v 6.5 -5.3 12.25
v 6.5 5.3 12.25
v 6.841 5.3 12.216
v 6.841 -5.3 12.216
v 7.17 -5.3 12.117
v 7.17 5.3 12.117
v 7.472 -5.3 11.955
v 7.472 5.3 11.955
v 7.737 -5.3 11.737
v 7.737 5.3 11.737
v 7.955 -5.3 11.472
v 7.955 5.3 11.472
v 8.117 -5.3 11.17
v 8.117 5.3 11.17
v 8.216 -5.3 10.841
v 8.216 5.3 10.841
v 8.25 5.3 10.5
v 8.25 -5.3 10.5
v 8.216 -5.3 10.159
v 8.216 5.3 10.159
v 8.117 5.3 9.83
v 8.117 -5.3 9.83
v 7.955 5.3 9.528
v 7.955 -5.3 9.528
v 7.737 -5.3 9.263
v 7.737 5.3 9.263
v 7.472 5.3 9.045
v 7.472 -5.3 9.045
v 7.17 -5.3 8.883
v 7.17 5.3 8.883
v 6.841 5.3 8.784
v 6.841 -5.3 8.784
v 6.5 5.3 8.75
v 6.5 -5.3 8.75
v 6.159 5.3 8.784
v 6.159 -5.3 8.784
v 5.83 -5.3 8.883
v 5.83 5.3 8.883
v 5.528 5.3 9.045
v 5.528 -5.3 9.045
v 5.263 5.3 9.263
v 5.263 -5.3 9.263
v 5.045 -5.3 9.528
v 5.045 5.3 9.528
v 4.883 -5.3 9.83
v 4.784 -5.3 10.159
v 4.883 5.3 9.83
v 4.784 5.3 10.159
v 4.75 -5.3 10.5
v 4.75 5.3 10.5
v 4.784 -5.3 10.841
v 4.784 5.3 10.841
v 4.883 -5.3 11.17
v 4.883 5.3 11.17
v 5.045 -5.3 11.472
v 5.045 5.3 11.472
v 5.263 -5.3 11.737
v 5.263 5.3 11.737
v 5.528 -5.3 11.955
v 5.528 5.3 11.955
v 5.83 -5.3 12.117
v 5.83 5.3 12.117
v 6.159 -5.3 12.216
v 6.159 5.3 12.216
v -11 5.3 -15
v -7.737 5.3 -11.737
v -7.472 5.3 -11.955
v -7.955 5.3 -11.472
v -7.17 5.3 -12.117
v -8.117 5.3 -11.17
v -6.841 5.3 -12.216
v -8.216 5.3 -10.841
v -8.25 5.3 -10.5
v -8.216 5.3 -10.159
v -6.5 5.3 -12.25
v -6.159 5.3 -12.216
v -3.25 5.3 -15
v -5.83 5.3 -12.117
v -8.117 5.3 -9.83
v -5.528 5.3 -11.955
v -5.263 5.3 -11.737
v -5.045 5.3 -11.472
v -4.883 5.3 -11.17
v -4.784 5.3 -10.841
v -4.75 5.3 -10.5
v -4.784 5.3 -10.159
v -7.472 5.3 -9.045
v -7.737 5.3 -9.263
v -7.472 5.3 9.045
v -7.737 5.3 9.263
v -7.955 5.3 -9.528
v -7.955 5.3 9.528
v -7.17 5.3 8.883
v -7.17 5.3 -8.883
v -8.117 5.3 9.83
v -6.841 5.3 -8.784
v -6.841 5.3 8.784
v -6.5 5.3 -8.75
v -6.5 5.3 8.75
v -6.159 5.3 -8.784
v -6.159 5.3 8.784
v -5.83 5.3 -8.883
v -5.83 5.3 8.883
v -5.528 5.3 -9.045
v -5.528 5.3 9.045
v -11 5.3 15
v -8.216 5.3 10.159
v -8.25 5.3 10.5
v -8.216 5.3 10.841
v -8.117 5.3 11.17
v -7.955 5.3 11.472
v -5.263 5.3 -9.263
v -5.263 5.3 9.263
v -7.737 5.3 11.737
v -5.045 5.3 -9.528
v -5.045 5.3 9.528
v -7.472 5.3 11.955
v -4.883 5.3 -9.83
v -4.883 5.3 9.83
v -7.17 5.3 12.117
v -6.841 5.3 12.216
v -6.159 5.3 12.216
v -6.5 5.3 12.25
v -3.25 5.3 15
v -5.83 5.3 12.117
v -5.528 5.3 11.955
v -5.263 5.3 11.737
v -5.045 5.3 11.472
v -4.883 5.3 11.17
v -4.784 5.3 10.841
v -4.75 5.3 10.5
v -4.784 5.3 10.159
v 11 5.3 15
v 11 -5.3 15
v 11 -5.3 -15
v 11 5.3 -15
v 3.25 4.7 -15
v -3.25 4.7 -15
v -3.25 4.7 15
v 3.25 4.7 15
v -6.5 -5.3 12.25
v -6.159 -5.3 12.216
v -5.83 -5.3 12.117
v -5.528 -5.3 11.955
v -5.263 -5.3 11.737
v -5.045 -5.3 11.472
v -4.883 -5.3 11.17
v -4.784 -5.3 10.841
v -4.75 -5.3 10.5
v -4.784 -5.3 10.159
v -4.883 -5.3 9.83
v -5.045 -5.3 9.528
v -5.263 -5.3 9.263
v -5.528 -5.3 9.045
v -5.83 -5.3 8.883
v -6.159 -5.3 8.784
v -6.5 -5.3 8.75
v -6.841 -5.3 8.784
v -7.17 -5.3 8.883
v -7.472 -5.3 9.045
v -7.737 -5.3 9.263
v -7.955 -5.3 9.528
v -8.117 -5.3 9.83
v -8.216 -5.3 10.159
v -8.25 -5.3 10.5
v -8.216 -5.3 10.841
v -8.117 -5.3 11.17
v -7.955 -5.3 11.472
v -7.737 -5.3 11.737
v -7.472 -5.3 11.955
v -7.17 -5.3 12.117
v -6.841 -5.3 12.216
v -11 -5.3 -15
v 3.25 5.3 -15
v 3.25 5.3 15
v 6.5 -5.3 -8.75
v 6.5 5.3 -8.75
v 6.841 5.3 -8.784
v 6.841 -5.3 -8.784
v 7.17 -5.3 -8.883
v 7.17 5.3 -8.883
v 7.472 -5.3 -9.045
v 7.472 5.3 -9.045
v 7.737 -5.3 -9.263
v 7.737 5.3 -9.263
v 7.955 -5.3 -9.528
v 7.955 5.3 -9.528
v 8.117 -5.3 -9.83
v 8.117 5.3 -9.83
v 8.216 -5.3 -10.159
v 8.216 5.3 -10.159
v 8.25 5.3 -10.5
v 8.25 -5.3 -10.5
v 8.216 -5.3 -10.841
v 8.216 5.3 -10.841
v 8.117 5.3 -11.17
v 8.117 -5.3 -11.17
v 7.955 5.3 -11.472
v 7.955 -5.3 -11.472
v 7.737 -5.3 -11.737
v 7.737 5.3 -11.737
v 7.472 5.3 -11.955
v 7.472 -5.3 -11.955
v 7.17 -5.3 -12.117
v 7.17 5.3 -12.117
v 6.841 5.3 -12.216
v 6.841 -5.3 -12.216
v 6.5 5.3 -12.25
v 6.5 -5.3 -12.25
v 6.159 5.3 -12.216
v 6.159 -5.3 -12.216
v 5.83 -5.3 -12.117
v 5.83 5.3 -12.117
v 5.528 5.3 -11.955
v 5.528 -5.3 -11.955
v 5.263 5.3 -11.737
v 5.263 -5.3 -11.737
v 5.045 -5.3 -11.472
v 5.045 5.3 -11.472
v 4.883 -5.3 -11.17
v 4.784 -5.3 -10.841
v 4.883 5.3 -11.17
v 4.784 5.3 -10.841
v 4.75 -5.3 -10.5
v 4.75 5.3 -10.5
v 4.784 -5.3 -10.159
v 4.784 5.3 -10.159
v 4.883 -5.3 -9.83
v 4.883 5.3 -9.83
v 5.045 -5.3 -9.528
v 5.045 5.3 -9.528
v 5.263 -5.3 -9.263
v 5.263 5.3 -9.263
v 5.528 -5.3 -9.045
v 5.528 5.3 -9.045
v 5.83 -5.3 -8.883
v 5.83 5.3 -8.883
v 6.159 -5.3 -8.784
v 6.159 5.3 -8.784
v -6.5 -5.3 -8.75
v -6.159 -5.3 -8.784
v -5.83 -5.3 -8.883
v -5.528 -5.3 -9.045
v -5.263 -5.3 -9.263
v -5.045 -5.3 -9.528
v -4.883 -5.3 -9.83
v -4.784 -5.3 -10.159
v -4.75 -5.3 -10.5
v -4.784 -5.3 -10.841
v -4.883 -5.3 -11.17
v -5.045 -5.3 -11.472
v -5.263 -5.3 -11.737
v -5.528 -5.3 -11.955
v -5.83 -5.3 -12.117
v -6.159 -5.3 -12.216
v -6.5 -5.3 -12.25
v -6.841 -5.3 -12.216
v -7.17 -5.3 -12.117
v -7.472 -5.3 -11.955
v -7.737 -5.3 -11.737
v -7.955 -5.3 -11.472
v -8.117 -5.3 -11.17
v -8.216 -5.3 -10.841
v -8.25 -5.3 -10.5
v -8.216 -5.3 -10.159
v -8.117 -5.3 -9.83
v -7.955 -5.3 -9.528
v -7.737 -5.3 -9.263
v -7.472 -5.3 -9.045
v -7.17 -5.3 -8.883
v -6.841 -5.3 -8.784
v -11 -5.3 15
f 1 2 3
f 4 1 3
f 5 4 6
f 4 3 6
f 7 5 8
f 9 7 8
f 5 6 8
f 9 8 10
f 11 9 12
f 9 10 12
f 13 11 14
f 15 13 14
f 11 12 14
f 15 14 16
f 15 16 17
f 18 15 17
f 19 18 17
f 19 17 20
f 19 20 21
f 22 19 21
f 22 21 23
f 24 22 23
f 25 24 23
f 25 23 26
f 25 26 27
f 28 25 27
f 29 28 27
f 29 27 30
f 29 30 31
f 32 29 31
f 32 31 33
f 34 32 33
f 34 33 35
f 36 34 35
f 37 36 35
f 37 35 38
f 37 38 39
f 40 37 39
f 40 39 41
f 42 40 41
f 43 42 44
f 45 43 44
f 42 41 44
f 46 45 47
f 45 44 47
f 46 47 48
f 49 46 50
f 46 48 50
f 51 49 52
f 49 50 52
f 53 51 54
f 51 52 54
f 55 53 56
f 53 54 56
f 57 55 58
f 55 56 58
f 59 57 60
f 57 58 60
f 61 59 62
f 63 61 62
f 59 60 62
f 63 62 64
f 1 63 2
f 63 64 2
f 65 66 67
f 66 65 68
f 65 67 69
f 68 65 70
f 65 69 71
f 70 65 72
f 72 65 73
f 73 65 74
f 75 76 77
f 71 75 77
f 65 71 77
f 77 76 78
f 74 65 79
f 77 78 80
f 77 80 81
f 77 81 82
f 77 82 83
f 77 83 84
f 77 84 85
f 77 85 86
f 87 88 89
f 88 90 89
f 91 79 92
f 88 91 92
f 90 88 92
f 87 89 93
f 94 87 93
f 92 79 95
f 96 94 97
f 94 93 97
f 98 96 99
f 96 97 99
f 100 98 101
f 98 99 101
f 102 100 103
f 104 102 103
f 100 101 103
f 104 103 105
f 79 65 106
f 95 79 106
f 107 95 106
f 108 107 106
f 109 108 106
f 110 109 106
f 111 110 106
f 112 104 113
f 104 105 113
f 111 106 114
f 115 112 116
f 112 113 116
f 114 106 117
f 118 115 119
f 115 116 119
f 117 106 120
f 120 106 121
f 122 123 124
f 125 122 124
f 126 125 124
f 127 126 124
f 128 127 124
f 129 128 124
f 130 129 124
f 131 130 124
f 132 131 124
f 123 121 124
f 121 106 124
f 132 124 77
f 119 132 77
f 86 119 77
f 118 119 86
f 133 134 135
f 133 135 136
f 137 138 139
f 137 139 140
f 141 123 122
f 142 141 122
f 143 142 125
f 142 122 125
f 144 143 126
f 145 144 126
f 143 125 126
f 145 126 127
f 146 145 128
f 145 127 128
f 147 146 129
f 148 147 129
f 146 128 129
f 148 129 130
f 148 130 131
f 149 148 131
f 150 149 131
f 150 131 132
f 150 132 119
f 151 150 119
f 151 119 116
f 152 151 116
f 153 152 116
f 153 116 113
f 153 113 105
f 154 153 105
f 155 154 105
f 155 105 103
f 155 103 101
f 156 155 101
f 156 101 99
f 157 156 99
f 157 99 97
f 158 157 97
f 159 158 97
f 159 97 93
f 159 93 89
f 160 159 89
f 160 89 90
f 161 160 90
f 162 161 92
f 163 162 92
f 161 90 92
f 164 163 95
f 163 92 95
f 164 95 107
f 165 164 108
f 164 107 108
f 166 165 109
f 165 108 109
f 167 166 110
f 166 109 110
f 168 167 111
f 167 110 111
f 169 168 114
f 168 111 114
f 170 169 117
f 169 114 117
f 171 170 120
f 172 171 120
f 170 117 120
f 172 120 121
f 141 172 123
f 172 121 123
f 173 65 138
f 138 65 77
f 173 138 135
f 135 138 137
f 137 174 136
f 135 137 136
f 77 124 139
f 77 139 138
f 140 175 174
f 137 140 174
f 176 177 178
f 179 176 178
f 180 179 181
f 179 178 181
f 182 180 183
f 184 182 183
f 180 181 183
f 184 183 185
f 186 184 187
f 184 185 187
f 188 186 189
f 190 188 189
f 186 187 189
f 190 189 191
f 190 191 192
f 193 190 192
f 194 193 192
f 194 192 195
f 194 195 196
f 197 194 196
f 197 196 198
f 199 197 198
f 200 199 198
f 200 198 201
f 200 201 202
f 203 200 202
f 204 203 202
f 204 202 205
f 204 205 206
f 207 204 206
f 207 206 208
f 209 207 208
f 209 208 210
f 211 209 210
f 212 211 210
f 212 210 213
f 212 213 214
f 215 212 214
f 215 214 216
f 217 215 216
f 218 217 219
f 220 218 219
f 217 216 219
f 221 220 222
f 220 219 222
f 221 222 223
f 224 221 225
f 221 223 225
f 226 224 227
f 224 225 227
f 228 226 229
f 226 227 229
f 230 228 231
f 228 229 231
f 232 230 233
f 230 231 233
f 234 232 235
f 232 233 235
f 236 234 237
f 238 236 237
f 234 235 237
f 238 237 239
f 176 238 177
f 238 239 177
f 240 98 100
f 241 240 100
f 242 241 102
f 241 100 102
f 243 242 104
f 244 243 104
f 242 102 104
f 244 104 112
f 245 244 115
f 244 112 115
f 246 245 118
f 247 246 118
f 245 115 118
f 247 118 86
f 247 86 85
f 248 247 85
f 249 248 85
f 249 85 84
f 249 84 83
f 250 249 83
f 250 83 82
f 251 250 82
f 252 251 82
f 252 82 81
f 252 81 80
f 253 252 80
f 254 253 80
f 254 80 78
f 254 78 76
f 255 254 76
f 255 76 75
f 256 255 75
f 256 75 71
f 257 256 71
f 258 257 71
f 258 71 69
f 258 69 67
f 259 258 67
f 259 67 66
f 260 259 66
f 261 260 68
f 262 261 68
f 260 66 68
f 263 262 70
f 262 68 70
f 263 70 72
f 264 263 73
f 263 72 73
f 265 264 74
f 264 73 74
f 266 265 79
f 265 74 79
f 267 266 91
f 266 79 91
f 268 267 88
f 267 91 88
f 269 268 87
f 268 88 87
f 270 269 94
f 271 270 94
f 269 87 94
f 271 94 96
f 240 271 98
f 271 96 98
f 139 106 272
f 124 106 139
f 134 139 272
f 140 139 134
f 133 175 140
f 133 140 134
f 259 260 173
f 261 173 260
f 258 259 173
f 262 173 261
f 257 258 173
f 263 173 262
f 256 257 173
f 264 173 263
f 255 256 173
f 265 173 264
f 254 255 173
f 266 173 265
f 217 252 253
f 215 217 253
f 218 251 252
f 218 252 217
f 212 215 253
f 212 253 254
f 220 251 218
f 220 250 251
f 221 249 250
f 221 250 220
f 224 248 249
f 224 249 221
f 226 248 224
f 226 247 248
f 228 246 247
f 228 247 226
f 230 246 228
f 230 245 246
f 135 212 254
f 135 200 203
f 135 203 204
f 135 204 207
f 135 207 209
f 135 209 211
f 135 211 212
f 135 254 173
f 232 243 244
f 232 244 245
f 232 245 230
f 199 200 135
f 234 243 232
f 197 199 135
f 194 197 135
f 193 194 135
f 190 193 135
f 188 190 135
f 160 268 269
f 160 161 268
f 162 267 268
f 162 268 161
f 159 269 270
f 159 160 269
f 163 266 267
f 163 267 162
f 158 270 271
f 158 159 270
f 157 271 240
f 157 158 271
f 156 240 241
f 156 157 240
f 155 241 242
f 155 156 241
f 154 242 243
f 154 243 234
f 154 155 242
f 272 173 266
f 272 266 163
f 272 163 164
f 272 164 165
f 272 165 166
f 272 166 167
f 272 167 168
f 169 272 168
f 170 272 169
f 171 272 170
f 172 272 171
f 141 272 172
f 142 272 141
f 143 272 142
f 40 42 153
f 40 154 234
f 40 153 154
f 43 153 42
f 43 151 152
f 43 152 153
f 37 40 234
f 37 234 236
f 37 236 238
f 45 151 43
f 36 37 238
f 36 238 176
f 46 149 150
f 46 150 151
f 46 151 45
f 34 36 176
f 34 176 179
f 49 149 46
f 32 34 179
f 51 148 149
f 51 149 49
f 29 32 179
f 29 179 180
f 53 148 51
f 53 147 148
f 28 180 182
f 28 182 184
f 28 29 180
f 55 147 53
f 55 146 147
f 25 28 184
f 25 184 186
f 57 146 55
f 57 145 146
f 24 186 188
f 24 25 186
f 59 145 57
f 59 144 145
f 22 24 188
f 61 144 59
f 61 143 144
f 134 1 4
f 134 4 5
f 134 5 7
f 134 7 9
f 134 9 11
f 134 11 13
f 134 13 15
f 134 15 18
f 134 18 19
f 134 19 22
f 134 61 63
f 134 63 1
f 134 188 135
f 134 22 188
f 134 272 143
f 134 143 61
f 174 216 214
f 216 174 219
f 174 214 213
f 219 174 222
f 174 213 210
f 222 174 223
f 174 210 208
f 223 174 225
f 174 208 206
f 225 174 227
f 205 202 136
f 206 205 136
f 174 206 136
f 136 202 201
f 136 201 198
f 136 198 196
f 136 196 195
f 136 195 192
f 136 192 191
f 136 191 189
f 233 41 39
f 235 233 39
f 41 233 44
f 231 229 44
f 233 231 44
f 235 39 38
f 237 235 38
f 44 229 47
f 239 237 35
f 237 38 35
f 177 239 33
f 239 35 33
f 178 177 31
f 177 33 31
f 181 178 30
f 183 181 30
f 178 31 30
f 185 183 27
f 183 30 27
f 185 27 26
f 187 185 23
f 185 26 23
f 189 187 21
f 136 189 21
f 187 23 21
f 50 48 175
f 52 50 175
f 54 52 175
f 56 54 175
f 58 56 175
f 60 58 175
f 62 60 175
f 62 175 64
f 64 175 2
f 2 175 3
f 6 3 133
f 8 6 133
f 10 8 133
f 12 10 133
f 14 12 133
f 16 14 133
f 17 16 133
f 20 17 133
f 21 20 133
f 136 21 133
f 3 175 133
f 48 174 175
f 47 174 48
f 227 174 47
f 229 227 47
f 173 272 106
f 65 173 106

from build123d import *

# Parameters (mm, degrees)
SCHIZZO1_W                   = 22
SCHIZZO1_H                   = 10.6
ESTRUSIONE_ESTRUSIONE1_DEPTH = 15
TAGLIO_ESTRUSIONE3_REACH     = 23.409
SCHIZZO5_R                   = 1.75
SCHIZZO5_3_W                 = 6.5
SCHIZZO5_3_H                 = 30
TAGLIO_ESTRUSIONE4_DEPTH     = 0.6


with BuildPart() as part:
    # Schizzo1 → Estrusione-Estrusione1 (new, symmetric)
    with BuildSketch(Plane.XY):
        Rectangle(SCHIZZO1_W, SCHIZZO1_H)
    extrude(amount=ESTRUSIONE_ESTRUSIONE1_DEPTH, both=True)

    # Schizzo5 → Taglio-Estrusione3 (cut, up to next)
    with BuildSketch(Plane(origin=(0, 5.3, 0), x_dir=(1, 0, 0), z_dir=(0, 1, 0)), mode=Mode.PRIVATE) as taglio_estrusione3_sk1:
        with Locations((6.5, 10.5)):
            Circle(SCHIZZO5_R)
    taglio_estrusione3_tool1 = extrude(taglio_estrusione3_sk1.sketch, amount=-TAGLIO_ESTRUSIONE3_REACH, mode=Mode.PRIVATE) & part.part
    # Schizzo5 → Taglio-Estrusione3 (cut, up to next)
    with BuildSketch(Plane(origin=(0, 5.3, 0), x_dir=(1, 0, 0), z_dir=(0, 1, 0)), mode=Mode.PRIVATE) as taglio_estrusione3_sk2:
        with Locations((6.5, -10.5)):
            Circle(SCHIZZO5_R)
    taglio_estrusione3_tool2 = extrude(taglio_estrusione3_sk2.sketch, amount=-TAGLIO_ESTRUSIONE3_REACH, mode=Mode.PRIVATE) & part.part
    # Schizzo5 → Taglio-Estrusione3 (cut, up to next)
    with BuildSketch(Plane(origin=(0, 5.3, 0), x_dir=(1, 0, 0), z_dir=(0, 1, 0)), mode=Mode.PRIVATE) as taglio_estrusione3_sk3:
        with Locations((-6.5, -10.5)):
            Circle(SCHIZZO5_R)
    taglio_estrusione3_tool3 = extrude(taglio_estrusione3_sk3.sketch, amount=-TAGLIO_ESTRUSIONE3_REACH, mode=Mode.PRIVATE) & part.part
    # Schizzo5 → Taglio-Estrusione3 (cut, up to next)
    with BuildSketch(Plane(origin=(0, 5.3, 0), x_dir=(1, 0, 0), z_dir=(0, 1, 0)), mode=Mode.PRIVATE) as taglio_estrusione3_sk4:
        with Locations((-6.5, 10.5)):
            Circle(SCHIZZO5_R)
    taglio_estrusione3_tool4 = extrude(taglio_estrusione3_sk4.sketch, amount=-TAGLIO_ESTRUSIONE3_REACH, mode=Mode.PRIVATE) & part.part
    add(taglio_estrusione3_tool1.solids().sort_by_distance((6.5, 5.3, -10.5))[0], mode=Mode.SUBTRACT)
    add(taglio_estrusione3_tool2.solids().sort_by_distance((6.5, 5.3, 10.5))[0], mode=Mode.SUBTRACT)
    add(taglio_estrusione3_tool3.solids().sort_by_distance((-6.5, 5.3, 10.5))[0], mode=Mode.SUBTRACT)
    add(taglio_estrusione3_tool4.solids().sort_by_distance((-6.5, 5.3, -10.5))[0], mode=Mode.SUBTRACT)

    # Schizzo5<3> → Taglio-Estrusione4 (cut)
    with BuildSketch(Plane(origin=(0, 5.3, 0), x_dir=(1, 0, 0), z_dir=(0, 1, 0))):
        Rectangle(SCHIZZO5_3_W, SCHIZZO5_3_H)
    extrude(amount=-TAGLIO_ESTRUSIONE4_DEPTH, mode=Mode.SUBTRACT)


solid = part.part
